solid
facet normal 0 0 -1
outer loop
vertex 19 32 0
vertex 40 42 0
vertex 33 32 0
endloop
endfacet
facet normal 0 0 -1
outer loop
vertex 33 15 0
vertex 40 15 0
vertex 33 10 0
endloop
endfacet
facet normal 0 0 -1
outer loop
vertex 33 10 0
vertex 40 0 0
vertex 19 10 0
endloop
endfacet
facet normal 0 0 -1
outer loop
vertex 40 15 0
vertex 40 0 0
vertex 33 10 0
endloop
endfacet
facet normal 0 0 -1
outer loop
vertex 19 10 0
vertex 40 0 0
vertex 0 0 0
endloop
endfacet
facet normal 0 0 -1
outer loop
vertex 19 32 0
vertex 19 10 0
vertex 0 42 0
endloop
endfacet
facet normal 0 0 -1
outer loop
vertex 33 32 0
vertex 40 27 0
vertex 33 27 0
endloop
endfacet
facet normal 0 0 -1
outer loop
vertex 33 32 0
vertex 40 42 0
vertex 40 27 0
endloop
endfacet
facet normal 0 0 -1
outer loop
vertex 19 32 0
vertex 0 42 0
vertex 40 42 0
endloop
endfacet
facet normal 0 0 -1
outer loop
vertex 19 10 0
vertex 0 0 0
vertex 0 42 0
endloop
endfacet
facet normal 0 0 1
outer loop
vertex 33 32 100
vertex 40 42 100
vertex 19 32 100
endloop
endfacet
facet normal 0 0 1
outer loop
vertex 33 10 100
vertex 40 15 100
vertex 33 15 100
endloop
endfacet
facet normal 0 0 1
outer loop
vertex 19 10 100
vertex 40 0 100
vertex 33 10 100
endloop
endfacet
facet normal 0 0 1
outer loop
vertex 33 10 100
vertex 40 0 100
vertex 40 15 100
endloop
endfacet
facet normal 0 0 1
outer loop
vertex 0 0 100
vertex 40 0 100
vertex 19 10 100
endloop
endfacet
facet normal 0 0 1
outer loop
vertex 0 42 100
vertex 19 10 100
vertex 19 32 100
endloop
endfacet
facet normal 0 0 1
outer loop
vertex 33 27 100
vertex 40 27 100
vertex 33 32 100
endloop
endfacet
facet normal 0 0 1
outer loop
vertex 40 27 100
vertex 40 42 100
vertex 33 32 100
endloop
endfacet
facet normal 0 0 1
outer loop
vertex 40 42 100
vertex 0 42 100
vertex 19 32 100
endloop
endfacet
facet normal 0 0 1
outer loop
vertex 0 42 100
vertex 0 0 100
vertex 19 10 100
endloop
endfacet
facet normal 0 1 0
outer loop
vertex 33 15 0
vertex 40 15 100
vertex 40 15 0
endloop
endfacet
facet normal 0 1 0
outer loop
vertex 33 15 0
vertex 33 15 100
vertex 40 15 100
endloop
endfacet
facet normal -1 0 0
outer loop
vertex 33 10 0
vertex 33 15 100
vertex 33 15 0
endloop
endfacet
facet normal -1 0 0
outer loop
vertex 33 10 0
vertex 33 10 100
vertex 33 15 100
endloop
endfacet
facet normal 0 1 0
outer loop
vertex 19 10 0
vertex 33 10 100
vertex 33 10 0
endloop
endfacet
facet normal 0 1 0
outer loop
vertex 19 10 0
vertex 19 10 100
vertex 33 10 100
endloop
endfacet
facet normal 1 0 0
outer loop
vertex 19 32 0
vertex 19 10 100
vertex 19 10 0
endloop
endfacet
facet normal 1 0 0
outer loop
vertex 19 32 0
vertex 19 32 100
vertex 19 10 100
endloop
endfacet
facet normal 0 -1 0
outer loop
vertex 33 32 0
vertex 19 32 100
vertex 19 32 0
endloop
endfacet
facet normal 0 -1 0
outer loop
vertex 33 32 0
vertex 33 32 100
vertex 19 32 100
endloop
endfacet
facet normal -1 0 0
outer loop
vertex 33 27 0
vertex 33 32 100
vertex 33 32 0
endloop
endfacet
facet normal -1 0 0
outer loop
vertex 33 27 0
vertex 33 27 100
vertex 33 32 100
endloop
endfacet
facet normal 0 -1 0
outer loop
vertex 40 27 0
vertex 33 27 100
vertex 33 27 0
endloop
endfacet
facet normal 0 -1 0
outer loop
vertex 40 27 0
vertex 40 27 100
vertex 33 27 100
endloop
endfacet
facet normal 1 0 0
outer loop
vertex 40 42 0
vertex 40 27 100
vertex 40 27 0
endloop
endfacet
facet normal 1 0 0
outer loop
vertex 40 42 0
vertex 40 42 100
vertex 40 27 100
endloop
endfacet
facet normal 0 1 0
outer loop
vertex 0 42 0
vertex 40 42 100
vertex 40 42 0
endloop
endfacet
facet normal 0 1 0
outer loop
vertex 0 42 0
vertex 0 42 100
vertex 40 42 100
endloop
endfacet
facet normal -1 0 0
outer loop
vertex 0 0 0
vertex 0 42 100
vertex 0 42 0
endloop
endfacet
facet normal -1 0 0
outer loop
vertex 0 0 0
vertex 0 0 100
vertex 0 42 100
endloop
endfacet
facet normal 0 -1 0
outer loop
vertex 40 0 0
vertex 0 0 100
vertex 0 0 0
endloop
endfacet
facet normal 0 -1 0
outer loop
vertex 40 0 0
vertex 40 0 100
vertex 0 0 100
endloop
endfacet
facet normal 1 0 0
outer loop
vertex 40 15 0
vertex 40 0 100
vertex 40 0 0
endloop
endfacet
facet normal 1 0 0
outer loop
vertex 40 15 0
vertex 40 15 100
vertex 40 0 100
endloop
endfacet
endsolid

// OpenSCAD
$fn = 32;

// ----------------------------------------------------------------------
// T-slot rail: 40 x 42 mm section, 100 mm long
// ----------------------------------------------------------------------

// --- parameters (mm) ---
profile_height = 100;     // extrusion height
profile_points = 12;      // points of the closed outline

profile = [[0, 0], [40, 0], [40, 15], [33, 15], [33, 10], [19, 10], [19, 32], [33, 32], [33, 27], [40, 27], [40, 42], [0, 42]];  // single closed polygon, 12 points, counter clockwise

// --- the one profile operation ---
linear_extrude(height = profile_height) polygon(points = profile);
